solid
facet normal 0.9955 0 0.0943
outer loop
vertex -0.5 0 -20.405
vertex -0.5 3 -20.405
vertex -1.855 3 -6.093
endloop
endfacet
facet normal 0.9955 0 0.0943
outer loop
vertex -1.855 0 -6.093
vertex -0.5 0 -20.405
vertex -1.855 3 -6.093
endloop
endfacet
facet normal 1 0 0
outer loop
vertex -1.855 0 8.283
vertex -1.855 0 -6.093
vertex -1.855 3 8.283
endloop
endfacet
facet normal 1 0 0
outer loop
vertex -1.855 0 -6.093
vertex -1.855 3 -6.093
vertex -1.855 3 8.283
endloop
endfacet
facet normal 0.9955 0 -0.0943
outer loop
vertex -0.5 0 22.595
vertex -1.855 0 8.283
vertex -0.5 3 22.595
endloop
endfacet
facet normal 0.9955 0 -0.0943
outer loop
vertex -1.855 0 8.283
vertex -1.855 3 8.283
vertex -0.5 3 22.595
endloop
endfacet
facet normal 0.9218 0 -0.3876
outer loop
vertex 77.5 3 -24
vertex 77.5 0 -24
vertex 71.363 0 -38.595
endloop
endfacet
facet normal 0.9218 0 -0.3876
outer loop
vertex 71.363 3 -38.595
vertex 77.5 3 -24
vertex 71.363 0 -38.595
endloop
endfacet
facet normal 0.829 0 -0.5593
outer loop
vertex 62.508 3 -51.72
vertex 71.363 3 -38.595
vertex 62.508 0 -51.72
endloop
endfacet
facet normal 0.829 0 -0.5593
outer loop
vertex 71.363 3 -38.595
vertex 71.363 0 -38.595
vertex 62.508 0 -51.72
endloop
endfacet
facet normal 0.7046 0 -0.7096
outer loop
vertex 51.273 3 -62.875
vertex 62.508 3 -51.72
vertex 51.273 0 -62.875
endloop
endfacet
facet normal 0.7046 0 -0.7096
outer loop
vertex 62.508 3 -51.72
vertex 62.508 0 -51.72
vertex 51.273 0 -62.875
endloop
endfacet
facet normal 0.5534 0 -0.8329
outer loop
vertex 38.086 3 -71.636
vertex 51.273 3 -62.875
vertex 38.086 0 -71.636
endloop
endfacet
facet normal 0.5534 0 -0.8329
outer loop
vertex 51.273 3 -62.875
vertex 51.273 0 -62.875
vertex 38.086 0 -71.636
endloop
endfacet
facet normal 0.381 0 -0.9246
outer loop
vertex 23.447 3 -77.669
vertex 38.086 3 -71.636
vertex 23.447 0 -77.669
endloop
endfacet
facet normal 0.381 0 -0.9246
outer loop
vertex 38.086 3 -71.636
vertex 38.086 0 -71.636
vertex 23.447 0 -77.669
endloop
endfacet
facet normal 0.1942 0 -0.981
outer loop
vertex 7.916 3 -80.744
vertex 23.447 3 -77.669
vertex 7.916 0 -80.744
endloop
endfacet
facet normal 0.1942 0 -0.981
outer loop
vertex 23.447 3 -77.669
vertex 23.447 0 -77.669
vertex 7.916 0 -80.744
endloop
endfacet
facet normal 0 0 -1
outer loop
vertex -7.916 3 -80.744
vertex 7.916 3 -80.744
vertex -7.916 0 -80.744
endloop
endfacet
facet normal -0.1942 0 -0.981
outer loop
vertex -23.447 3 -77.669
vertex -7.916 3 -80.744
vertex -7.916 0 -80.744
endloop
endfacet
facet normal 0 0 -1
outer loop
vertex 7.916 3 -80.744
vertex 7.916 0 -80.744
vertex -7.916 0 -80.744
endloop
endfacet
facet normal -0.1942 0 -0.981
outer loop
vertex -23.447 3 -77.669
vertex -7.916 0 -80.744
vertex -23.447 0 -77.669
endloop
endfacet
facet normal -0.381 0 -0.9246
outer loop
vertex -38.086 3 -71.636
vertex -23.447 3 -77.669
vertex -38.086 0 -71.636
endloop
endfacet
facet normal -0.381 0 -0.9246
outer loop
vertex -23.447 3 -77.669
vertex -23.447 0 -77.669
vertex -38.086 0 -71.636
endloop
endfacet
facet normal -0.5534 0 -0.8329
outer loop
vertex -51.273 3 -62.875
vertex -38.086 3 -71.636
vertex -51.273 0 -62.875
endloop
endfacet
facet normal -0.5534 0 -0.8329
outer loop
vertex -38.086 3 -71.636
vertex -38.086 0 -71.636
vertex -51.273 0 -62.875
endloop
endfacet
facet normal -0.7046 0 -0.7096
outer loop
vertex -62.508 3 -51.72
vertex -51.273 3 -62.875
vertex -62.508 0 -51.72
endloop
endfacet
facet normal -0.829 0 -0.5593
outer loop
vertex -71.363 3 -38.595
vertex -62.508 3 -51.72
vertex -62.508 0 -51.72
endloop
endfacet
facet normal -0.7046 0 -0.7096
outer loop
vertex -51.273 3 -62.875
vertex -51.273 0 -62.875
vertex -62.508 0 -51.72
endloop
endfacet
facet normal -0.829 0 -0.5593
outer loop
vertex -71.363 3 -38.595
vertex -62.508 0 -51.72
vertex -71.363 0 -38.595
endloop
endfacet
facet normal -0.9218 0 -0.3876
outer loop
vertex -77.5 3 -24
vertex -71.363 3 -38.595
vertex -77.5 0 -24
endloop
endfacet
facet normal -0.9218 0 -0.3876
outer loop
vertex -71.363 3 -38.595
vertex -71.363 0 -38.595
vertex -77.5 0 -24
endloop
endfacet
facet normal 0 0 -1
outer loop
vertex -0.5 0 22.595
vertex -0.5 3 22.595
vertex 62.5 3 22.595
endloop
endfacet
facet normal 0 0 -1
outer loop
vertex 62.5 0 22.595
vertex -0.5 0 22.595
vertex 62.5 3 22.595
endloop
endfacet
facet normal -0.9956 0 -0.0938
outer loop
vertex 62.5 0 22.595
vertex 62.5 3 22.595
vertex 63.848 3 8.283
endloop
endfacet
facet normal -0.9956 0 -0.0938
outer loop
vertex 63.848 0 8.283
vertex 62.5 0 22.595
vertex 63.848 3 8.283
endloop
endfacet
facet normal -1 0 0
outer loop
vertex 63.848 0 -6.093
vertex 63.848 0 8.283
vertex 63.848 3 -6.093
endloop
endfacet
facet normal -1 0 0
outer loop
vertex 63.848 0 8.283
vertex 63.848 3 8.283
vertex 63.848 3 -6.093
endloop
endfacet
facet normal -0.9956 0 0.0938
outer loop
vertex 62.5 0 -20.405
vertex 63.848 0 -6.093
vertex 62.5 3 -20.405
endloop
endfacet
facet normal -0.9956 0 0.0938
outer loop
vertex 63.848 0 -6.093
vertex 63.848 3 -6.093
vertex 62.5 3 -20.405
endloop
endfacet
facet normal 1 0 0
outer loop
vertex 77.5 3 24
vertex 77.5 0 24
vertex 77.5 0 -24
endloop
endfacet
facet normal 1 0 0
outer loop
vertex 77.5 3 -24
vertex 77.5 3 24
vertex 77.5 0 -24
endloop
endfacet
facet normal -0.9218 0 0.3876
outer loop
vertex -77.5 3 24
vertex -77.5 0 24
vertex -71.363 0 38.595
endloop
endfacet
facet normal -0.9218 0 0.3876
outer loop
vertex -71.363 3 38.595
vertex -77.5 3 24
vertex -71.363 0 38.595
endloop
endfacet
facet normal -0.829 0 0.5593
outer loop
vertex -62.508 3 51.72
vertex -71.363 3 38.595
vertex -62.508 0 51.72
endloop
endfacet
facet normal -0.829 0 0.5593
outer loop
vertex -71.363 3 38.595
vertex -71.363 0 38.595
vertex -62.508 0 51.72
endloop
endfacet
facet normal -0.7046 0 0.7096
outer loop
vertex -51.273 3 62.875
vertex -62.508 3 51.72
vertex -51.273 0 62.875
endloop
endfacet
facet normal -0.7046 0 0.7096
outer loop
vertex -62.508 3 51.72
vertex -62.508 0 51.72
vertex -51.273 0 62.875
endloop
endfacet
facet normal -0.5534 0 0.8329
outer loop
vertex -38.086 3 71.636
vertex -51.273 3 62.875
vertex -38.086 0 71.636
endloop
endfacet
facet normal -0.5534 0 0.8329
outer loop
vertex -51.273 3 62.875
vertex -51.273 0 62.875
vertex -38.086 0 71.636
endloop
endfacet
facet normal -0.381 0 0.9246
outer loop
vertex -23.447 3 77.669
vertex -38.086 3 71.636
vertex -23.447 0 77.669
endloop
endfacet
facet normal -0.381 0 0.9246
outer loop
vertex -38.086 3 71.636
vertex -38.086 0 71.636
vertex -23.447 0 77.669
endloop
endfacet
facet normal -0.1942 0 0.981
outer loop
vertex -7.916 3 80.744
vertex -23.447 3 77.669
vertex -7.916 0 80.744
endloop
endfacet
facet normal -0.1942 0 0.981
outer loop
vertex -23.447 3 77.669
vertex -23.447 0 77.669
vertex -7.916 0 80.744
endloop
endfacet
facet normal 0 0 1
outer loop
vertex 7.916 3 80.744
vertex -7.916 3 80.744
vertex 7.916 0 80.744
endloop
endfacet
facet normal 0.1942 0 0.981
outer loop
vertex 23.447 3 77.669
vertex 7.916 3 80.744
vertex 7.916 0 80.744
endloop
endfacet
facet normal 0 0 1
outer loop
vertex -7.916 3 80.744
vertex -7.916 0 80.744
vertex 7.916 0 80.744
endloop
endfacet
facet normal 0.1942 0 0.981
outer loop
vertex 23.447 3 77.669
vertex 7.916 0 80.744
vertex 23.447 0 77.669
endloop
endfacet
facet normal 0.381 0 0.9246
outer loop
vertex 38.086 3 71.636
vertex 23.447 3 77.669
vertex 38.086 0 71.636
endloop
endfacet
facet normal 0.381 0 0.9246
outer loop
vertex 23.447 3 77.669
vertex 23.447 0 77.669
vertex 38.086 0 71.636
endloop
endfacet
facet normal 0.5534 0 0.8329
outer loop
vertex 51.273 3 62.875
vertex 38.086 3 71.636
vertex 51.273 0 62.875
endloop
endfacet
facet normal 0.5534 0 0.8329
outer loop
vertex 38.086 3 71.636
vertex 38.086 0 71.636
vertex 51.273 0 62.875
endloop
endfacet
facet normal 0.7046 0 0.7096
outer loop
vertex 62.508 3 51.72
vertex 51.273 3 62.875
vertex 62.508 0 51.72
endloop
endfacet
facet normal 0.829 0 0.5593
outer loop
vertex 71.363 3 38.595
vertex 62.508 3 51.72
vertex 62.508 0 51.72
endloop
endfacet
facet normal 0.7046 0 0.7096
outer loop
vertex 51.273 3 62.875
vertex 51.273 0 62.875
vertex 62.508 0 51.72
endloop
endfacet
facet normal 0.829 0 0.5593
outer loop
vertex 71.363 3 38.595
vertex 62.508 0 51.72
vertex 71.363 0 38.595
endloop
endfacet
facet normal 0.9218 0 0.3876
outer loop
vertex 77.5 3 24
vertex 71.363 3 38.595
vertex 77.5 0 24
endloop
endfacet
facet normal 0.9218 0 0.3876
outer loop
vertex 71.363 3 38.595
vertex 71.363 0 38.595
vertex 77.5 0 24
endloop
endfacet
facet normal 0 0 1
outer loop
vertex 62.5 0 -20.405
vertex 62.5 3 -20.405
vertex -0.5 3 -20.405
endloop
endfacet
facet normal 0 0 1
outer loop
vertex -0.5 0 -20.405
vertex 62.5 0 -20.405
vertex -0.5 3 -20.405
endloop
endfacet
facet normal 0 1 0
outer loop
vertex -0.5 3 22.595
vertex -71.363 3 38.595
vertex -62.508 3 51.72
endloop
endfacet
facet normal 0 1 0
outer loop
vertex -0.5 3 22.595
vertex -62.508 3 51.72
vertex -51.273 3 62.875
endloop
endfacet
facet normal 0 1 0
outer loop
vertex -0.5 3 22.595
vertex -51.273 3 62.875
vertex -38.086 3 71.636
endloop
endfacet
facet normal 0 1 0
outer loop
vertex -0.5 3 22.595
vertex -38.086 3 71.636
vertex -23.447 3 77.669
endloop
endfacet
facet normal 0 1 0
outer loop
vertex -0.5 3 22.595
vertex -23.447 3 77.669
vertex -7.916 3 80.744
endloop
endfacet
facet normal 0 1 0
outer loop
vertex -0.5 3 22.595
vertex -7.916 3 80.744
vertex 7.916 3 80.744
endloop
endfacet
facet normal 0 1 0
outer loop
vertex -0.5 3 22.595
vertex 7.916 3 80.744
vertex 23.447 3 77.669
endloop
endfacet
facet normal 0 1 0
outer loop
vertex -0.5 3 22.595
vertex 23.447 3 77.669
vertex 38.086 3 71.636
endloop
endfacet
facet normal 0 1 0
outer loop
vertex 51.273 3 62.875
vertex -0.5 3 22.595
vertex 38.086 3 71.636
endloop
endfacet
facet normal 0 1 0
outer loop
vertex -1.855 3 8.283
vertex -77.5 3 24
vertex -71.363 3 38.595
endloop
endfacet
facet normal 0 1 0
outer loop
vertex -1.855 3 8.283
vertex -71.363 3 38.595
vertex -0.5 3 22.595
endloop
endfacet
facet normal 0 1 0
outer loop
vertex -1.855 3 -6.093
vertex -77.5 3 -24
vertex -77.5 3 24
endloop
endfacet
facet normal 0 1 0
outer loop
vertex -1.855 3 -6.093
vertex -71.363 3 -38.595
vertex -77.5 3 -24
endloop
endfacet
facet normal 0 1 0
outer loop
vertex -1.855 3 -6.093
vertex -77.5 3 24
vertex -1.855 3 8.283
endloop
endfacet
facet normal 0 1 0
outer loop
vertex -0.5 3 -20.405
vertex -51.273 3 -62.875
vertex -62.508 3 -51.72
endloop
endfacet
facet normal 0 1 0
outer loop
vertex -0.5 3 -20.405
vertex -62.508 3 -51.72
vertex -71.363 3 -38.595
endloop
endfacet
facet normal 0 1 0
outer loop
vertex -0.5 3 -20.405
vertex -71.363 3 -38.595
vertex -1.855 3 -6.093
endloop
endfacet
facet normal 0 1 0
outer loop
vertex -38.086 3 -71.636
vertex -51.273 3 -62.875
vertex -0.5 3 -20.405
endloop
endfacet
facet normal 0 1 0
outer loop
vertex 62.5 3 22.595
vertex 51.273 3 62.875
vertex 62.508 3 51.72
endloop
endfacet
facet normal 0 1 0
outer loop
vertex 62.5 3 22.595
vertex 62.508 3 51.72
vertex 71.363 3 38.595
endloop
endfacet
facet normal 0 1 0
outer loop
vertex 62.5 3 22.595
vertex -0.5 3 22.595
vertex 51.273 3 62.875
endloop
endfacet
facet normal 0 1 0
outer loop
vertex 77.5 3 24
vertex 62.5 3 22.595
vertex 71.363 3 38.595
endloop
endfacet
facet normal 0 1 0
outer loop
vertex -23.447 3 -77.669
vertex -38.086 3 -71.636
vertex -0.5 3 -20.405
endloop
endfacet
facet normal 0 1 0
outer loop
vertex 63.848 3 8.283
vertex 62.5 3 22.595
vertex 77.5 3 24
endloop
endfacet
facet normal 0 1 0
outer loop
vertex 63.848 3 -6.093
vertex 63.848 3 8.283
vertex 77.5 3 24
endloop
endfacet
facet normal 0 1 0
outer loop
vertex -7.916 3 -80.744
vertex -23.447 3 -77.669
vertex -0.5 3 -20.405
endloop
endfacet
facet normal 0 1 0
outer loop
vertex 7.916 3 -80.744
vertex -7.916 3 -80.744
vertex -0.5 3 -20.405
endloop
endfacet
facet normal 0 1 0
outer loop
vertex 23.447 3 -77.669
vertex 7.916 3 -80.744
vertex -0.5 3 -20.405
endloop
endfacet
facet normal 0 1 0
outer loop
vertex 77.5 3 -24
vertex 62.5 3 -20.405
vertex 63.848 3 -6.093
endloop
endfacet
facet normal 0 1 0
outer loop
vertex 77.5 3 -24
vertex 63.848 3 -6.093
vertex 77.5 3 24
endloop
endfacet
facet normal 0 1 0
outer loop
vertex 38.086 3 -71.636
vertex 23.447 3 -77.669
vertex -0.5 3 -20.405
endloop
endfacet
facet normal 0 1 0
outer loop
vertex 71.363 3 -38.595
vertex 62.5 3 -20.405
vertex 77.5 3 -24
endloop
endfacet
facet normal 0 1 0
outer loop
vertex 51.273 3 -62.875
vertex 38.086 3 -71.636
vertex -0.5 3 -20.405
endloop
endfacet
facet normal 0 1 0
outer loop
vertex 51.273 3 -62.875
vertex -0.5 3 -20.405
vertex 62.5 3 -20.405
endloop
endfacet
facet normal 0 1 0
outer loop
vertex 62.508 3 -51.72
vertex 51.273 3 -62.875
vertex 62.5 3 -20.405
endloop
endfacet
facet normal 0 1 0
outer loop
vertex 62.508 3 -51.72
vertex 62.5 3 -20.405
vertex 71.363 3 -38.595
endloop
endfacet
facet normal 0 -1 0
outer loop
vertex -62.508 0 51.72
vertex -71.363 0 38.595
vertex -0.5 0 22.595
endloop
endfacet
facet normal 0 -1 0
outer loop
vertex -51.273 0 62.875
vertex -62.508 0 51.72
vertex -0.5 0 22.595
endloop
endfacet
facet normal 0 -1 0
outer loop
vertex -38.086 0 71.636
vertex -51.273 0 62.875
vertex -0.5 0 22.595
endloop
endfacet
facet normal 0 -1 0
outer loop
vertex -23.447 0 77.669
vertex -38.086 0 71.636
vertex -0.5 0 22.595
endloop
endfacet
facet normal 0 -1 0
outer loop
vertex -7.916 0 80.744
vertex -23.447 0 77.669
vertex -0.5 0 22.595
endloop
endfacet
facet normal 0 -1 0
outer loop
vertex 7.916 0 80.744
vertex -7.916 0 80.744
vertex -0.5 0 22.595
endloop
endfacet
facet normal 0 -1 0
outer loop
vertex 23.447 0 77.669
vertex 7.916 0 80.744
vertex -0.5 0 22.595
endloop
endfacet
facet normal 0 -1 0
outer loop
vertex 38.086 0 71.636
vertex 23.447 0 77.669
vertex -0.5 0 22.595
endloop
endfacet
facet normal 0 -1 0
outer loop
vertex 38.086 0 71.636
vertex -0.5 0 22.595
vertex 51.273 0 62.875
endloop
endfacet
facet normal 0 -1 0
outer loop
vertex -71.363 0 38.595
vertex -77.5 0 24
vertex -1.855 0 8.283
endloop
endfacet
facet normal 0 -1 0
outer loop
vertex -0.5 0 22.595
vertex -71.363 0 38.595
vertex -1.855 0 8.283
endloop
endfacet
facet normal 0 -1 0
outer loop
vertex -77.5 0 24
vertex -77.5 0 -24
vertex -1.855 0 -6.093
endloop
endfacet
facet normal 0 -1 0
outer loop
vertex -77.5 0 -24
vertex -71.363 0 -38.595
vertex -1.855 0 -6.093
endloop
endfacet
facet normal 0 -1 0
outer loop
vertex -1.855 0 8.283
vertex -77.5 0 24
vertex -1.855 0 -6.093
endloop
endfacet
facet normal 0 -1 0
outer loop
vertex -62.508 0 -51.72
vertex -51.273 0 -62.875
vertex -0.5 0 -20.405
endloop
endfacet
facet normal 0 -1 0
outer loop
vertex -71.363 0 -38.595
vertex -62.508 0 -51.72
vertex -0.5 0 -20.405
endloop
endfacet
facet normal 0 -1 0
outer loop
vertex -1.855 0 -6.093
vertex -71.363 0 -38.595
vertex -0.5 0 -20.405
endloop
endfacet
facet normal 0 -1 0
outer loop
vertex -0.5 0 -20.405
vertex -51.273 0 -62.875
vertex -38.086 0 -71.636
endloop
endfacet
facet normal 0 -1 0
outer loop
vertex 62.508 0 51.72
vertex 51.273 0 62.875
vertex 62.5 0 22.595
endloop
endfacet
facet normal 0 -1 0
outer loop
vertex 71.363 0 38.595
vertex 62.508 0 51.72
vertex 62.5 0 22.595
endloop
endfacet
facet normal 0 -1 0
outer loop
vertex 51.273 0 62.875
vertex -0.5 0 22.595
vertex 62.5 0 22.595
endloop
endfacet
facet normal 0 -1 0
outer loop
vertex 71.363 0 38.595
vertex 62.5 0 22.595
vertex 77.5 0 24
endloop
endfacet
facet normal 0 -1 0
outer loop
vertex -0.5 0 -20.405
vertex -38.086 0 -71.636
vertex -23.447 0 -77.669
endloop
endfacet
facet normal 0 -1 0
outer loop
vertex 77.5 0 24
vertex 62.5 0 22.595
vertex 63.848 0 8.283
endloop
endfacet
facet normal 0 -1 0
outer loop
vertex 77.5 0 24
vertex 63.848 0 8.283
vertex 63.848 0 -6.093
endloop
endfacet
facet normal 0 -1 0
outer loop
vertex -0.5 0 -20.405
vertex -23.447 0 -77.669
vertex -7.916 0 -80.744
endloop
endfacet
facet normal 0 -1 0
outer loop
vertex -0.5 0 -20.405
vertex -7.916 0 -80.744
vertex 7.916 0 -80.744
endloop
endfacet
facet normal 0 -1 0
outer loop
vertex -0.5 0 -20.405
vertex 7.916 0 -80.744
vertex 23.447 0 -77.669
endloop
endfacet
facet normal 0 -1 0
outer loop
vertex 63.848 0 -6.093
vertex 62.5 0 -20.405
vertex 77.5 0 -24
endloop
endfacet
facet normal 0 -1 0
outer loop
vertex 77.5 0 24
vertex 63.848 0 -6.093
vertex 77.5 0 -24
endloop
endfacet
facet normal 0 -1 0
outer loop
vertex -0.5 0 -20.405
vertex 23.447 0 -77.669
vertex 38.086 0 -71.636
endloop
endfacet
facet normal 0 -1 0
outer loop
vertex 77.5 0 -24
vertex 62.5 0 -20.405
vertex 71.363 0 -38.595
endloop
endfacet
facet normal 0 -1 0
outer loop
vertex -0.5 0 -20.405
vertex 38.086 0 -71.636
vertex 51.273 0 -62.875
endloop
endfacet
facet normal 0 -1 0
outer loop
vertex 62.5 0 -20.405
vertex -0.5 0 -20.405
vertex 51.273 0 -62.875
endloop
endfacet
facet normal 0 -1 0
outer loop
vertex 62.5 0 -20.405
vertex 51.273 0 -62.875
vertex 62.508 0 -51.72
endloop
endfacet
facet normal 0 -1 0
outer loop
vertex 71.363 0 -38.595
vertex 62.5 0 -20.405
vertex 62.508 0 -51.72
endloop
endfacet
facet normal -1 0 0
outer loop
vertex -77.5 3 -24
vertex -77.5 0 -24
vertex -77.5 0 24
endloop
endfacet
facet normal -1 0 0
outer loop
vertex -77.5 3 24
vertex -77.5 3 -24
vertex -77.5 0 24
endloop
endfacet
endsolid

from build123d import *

# Parameters (mm, degrees)
Y_KSEKLIK_EKSTR_ZYON1_DEPTH = 3
KES_EKSTR_ZYON2_DEPTH       = 5.5


with BuildPart() as part:
    # Çizim1 → Yükseklik-Ekstrüzyon1 (new body)
    with BuildSketch(Plane(origin=(0, 0, 0), x_dir=(1, 0, 0), z_dir=(0, 1, 0))):
        with BuildLine():
            Line((-77.5, 24), (-77.5, -24))
            ThreePointArc((-77.5, -24), (0, -81.131066799), (77.5, -24))
            Line((77.5, -24), (77.5, 24))
            ThreePointArc((77.5, 24), (0, 81.131066799), (-77.5, 24))
        make_face()
    extrude(amount=Y_KSEKLIK_EKSTR_ZYON1_DEPTH)

    # Çizim4 → Kes-Ekstrüzyon2 (cut)
    with BuildSketch(Plane(origin=(0, 3, 0), x_dir=(1, 0, 0), z_dir=(0, 1, 0))):
        with BuildLine():
            Line((62.5, 20.404916559), (-0.5, 20.404916559))
            ThreePointArc((-0.5, 20.404916559), (-2.024235699, -1.095083441), (-0.5, -22.595083441))
            Line((-0.5, -22.595083441), (62.5, -22.595083441))
            ThreePointArc((62.5, -22.595083441), (64.017330872, -1.095083441), (62.5, 20.404916559))
        make_face()
    extrude(amount=-KES_EKSTR_ZYON2_DEPTH, mode=Mode.SUBTRACT)


solid = part.part
